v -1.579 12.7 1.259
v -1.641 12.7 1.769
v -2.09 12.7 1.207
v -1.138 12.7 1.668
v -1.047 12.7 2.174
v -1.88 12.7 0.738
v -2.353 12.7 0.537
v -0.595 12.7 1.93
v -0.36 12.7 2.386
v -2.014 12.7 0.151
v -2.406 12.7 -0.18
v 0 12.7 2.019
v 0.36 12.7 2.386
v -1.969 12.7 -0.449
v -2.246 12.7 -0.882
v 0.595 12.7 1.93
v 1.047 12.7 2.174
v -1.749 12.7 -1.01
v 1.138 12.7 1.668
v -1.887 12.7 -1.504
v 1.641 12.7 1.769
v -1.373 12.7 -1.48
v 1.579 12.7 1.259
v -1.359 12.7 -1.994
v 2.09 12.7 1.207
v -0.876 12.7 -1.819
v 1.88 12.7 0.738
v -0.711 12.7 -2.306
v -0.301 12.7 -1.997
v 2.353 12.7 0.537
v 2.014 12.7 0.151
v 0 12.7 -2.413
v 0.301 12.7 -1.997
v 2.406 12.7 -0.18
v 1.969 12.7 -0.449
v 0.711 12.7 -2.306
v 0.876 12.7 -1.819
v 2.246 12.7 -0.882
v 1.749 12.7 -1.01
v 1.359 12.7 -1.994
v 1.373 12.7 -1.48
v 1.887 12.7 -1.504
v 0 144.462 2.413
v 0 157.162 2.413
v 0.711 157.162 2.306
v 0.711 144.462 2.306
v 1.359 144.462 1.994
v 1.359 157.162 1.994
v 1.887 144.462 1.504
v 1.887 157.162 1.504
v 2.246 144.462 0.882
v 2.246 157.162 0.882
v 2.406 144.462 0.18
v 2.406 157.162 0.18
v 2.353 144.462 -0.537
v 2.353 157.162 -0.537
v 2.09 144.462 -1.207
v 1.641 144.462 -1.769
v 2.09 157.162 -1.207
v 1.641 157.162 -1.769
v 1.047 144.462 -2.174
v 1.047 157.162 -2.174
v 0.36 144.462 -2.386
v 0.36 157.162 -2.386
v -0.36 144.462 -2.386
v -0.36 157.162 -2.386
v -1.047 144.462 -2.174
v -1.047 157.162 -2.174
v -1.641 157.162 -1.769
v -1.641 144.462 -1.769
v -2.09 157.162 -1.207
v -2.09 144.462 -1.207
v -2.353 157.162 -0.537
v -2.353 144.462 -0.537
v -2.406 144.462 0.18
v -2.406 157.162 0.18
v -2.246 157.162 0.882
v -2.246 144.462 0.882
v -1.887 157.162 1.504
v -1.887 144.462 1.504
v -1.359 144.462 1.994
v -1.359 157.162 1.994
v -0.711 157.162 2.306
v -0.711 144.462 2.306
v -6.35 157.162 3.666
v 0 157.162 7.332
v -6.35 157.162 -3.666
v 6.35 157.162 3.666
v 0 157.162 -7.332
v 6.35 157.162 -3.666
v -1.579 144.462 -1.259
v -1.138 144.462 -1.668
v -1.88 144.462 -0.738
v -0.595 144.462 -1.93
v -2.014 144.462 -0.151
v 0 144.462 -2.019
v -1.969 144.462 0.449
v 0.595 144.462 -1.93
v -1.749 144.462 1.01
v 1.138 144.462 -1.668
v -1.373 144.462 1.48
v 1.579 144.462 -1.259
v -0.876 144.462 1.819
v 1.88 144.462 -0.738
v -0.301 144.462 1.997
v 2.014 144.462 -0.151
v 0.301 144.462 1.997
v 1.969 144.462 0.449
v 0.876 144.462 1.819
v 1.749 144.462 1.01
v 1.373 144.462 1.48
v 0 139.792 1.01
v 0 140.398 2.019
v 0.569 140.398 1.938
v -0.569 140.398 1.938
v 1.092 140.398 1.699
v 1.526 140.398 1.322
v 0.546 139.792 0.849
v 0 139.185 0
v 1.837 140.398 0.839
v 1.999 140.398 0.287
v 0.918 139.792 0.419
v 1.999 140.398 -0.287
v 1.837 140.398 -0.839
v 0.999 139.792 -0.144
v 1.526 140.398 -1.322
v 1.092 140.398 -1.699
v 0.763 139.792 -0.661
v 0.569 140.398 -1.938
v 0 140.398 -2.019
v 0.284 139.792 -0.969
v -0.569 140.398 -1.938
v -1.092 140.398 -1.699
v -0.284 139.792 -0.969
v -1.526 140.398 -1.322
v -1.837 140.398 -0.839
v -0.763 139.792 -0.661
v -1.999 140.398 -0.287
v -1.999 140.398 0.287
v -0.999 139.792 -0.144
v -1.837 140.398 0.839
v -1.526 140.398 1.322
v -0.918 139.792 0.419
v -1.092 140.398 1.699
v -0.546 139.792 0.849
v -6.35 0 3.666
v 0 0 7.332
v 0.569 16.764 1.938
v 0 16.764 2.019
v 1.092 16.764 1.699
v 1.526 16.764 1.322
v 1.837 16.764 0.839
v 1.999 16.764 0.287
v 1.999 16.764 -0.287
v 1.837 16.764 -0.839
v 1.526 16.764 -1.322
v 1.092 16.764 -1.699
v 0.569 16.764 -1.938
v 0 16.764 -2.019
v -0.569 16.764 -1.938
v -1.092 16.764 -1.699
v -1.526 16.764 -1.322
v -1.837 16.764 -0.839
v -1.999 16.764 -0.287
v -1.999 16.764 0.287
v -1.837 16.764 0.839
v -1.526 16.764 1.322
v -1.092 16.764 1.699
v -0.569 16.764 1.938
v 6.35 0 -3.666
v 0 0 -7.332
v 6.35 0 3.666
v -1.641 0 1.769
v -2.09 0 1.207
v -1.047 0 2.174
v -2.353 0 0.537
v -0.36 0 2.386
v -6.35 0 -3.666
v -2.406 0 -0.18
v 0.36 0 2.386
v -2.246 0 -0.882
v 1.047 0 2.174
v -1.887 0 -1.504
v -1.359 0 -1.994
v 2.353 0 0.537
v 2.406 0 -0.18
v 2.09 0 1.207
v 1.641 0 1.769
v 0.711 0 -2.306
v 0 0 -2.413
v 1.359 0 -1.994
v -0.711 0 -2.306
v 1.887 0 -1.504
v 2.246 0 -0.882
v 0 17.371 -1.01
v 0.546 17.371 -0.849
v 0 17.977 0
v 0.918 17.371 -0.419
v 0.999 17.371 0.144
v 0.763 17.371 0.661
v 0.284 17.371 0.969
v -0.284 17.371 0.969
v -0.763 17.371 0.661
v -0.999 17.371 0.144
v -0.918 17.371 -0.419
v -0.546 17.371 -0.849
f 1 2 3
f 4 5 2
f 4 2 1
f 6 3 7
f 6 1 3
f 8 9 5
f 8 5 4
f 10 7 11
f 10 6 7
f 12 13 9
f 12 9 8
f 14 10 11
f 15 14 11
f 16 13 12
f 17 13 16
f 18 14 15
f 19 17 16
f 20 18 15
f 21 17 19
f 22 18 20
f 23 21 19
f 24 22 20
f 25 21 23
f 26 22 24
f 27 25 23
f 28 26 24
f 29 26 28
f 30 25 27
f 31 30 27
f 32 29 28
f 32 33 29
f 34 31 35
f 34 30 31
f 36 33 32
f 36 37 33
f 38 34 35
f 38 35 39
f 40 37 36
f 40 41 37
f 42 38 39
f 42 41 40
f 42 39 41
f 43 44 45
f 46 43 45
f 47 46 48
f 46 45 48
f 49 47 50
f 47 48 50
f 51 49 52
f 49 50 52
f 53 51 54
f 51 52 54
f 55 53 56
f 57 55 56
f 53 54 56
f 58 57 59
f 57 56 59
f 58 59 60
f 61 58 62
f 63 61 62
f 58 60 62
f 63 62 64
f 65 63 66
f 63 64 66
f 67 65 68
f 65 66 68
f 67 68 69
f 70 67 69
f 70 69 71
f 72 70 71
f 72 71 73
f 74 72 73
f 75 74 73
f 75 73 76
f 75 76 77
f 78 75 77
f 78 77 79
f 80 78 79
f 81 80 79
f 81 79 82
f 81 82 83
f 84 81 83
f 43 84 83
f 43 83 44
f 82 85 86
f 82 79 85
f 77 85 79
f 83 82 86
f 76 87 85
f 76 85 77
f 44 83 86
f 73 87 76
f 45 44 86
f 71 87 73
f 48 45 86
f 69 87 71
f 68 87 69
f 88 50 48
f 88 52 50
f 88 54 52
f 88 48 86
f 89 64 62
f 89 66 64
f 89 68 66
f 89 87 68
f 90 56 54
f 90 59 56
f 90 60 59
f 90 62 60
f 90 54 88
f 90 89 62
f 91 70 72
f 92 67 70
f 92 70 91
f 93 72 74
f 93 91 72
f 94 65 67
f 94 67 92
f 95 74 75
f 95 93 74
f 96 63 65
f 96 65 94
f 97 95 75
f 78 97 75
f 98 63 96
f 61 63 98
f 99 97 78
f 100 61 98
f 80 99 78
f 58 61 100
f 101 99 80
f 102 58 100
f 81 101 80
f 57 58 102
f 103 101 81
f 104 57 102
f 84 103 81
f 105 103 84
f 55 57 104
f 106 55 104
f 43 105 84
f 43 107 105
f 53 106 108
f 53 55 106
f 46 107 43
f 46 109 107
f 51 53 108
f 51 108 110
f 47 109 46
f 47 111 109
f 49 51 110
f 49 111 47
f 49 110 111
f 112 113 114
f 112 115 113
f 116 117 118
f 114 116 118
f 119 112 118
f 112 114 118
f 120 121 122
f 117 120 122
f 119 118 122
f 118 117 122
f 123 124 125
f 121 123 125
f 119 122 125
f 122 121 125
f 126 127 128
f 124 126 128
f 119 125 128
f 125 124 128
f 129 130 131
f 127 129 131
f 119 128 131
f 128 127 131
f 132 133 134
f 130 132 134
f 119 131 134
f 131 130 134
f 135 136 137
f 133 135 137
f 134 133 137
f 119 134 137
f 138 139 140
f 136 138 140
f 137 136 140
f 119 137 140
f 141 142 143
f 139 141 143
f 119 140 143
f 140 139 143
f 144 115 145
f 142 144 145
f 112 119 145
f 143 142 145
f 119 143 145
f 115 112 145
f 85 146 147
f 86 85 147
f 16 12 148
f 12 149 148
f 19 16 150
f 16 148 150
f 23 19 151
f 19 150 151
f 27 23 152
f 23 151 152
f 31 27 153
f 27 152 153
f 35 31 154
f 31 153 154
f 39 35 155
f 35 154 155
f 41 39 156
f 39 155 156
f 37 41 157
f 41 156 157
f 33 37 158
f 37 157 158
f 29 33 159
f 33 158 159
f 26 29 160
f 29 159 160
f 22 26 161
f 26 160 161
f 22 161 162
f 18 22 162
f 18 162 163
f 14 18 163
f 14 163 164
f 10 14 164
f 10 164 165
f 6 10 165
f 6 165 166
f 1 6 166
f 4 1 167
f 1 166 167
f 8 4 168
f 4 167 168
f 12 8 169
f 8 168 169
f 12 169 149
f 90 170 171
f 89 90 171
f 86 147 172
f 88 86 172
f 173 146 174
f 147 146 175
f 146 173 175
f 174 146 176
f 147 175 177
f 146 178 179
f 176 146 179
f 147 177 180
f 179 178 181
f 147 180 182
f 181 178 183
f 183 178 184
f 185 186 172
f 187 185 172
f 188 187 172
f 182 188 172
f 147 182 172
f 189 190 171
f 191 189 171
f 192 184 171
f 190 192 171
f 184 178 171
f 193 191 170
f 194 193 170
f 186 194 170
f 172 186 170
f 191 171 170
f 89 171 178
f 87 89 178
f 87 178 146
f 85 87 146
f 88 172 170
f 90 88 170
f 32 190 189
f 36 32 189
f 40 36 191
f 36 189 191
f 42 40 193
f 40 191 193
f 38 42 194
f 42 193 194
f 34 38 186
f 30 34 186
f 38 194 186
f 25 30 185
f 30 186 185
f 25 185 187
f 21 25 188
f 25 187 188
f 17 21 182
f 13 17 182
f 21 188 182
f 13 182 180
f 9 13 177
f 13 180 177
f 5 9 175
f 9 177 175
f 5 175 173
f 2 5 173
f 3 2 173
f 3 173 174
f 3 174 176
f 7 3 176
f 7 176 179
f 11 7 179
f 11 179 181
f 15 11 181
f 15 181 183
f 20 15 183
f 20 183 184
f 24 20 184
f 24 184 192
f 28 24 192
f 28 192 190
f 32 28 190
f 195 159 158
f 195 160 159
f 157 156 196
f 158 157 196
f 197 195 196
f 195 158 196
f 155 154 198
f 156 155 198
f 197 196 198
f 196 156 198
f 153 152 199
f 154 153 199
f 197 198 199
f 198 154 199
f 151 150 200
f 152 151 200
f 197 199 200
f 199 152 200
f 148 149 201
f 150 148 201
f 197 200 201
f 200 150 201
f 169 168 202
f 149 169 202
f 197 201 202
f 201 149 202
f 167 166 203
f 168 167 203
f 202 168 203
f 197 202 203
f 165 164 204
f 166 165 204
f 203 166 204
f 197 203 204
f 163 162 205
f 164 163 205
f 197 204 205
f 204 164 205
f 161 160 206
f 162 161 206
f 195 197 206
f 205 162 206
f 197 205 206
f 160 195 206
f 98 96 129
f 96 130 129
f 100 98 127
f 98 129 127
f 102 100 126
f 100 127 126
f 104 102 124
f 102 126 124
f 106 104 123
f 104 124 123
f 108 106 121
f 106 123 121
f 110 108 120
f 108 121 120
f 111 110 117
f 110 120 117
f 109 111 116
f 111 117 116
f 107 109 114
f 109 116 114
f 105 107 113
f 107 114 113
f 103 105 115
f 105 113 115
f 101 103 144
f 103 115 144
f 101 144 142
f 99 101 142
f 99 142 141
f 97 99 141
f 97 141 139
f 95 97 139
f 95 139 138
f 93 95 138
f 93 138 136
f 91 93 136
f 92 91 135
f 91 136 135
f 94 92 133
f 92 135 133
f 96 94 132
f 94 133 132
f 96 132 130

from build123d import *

# Parameters (mm, degrees)
BOSS_EXTRUDE1_DEPTH                        = 157.1625
F_10_32_TAPPED_HOLE1_D                     = 4.0386
F_10_32_TAPPED_HOLE1_DEPTH                 = 16.764
F_10_32_TAPPED_HOLE1_CBORE_D               = 4.826
F_10_32_TAPPED_HOLE1_CBORE_DEPTH           = 12.7
F_10_32_TAPPED_HOLE1_TIP                   = 1.213317848
F_10_32_TAPPED_HOLE1_ON_FACE_2_D           = 4.0386
F_10_32_TAPPED_HOLE1_ON_FACE_2_DEPTH       = 16.764
F_10_32_TAPPED_HOLE1_ON_FACE_2_CBORE_D     = 4.826
F_10_32_TAPPED_HOLE1_ON_FACE_2_CBORE_DEPTH = 12.7
F_10_32_TAPPED_HOLE1_ON_FACE_2_TIP         = 1.213317848


with BuildPart() as part:
    # Sketch1 → Boss-Extrude1 (new body)
    with BuildSketch(Plane(origin=(0, 0, 0), x_dir=(1, 0, 0), z_dir=(0, 1, 0))):
        Polygon((0, 7.332348419), (-6.35, 3.666174209), (-6.35, -3.666174209), (0, -7.332348419), (6.35, -3.666174209), (6.35, 3.666174209), align=None)
    extrude(amount=BOSS_EXTRUDE1_DEPTH)

    # #10-32 Tapped Hole1
    with Locations(Plane.ZX.offset(157.1625)):
        with Locations((0, 0)):
            CounterBoreHole(F_10_32_TAPPED_HOLE1_D / 2, F_10_32_TAPPED_HOLE1_CBORE_D / 2, F_10_32_TAPPED_HOLE1_CBORE_DEPTH, depth=F_10_32_TAPPED_HOLE1_DEPTH)
            with Locations((0, 0, -(F_10_32_TAPPED_HOLE1_DEPTH + F_10_32_TAPPED_HOLE1_TIP / 2))):  # 118° drill point
                Cone(0, F_10_32_TAPPED_HOLE1_D / 2, F_10_32_TAPPED_HOLE1_TIP, mode=Mode.SUBTRACT)

    # #10-32 Tapped Hole1 on face 2
    with Locations(Plane(origin=(0, 0, 0), x_dir=(0, 0, -1), z_dir=(0, -1, 0))):
        with Locations((0, 0)):
            CounterBoreHole(F_10_32_TAPPED_HOLE1_ON_FACE_2_D / 2, F_10_32_TAPPED_HOLE1_ON_FACE_2_CBORE_D / 2, F_10_32_TAPPED_HOLE1_ON_FACE_2_CBORE_DEPTH, depth=F_10_32_TAPPED_HOLE1_ON_FACE_2_DEPTH)
            with Locations((0, 0, -(F_10_32_TAPPED_HOLE1_ON_FACE_2_DEPTH + F_10_32_TAPPED_HOLE1_ON_FACE_2_TIP / 2))):  # 118° drill point
                Cone(0, F_10_32_TAPPED_HOLE1_ON_FACE_2_D / 2, F_10_32_TAPPED_HOLE1_ON_FACE_2_TIP, mode=Mode.SUBTRACT)


solid = part.part
